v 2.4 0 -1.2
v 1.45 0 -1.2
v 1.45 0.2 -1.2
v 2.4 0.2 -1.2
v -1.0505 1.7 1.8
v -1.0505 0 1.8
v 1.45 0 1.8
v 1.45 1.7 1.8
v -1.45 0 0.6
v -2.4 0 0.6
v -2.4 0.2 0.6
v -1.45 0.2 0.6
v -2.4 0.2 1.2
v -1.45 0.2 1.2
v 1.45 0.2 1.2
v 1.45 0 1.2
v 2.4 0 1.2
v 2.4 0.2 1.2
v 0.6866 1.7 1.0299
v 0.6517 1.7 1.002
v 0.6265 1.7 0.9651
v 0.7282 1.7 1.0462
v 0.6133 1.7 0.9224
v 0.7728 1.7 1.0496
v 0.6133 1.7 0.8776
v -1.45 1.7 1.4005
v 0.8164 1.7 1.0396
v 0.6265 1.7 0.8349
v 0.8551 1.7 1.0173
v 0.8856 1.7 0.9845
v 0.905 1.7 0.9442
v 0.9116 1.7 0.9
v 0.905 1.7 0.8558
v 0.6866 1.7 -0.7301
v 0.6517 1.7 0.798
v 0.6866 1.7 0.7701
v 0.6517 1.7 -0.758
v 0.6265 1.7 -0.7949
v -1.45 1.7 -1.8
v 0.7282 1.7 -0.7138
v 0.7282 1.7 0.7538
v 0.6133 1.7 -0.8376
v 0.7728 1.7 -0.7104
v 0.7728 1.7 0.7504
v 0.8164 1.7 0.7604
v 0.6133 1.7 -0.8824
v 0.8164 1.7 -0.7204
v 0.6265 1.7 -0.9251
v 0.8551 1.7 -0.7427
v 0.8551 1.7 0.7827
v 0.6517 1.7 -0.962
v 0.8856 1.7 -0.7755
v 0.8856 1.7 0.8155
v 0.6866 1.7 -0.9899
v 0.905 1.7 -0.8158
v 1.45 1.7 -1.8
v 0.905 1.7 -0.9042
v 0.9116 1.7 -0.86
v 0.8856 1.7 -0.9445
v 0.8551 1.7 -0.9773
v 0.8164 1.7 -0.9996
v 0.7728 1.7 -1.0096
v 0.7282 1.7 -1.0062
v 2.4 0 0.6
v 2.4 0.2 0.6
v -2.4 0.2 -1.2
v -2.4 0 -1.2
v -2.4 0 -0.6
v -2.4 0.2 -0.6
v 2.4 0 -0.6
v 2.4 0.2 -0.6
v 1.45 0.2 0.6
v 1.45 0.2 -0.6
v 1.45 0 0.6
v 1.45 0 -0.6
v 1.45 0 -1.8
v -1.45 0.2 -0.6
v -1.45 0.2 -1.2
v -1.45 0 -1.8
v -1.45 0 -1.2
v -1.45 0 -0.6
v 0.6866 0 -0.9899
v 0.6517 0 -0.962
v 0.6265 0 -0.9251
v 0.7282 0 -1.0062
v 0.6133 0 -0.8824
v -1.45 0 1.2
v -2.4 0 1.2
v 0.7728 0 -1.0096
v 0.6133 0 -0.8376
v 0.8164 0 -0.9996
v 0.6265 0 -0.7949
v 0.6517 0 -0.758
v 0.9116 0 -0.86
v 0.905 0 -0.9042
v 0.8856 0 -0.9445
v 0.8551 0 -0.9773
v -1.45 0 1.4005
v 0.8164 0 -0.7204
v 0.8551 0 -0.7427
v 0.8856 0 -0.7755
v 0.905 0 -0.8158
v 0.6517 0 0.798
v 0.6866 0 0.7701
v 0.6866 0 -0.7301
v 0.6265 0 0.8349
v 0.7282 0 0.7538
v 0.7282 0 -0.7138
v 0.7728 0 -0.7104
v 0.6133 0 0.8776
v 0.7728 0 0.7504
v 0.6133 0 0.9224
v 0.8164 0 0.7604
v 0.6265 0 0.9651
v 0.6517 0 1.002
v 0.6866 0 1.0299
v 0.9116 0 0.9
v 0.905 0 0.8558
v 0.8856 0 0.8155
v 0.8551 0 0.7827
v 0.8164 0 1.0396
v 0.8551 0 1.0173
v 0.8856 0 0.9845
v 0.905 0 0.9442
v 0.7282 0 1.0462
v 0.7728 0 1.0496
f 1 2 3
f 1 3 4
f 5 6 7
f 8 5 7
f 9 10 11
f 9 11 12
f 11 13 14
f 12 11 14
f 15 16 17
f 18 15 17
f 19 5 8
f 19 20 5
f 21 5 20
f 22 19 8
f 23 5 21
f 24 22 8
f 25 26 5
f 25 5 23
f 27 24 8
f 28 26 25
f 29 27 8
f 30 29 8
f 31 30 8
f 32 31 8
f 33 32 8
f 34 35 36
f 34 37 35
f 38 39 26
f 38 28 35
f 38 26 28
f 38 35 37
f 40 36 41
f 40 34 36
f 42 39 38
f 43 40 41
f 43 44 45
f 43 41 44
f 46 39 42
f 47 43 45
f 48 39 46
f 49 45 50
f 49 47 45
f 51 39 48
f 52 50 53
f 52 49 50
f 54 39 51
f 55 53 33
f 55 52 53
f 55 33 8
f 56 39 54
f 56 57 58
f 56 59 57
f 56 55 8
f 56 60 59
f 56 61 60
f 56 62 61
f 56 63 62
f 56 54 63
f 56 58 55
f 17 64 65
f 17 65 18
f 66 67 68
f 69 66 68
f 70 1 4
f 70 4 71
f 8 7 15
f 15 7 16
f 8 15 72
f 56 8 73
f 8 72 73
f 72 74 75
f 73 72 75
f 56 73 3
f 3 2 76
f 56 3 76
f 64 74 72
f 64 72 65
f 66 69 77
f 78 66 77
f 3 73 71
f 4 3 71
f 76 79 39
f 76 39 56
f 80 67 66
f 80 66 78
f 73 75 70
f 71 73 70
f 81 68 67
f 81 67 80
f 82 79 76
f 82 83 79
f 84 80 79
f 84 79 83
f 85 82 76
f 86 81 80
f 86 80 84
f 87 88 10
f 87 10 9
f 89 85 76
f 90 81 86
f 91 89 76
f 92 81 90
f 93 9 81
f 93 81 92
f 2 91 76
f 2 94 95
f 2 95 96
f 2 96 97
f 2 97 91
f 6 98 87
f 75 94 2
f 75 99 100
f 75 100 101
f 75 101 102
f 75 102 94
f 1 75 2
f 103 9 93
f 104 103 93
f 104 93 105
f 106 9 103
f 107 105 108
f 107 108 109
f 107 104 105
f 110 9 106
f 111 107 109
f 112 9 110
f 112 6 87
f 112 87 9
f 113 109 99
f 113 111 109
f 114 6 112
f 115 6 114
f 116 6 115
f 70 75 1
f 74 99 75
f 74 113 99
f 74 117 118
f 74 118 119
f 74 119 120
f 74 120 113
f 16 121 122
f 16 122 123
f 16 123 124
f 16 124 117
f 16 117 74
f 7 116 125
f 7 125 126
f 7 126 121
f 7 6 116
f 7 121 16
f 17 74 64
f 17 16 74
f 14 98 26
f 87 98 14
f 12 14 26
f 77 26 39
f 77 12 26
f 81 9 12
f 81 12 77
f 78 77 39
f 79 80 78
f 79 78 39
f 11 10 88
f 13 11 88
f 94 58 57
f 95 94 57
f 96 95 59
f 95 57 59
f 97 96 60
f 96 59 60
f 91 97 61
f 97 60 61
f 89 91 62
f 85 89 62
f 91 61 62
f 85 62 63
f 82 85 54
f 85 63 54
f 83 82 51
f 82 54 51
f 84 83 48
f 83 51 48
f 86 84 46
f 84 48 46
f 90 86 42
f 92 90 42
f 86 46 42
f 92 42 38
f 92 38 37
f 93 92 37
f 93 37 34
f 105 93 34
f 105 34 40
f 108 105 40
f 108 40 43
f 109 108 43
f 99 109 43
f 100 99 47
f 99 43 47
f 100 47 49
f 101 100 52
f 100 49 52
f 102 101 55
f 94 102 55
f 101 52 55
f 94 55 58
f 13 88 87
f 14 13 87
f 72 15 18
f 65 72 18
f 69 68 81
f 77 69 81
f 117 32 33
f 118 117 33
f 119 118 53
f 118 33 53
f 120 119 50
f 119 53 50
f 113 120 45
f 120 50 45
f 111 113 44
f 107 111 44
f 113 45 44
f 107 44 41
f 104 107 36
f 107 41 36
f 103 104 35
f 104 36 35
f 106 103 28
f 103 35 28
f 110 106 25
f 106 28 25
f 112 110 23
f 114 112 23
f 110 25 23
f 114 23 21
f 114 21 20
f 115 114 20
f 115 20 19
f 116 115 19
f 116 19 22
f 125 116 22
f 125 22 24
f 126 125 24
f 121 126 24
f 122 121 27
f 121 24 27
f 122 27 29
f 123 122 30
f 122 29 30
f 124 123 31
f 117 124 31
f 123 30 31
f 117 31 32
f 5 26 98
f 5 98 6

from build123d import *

# Parameters (mm, degrees)
SKETCH_1_W          = 2.9
SKETCH_1_H          = 3.6
EXTRUDE_1_DEPTH     = 1.7
CUT_EXTRUDE_1_DEPTH = 1.7
SKETCH_5_W          = 4.8
SKETCH_5_H          = 0.6
EXTRUDE_2_DEPTH     = 0.2
SKETCH_4_R          = 0.15
CUT_EXTRUDE_2_DEPTH = 1.7


with BuildPart() as part:
    # 스케치1 → 보스-돌출1 (new body)
    with BuildSketch(Plane(origin=(0, 0, 0), x_dir=(1, 0, 0), z_dir=(0, 1, 0))):
        Rectangle(SKETCH_1_W, SKETCH_1_H)
    extrude(amount=EXTRUDE_1_DEPTH)

    # 스케치3 → 컷-돌출1 (cut)
    with BuildSketch(Plane(origin=(0, 1.7, 0), x_dir=(1, 0, 0), z_dir=(0, 1, 0))):
        Polygon((-1.45047429, -1.4), (-1.05, -1.80047429), (-1.45, -1.8), align=None)
    extrude(amount=-CUT_EXTRUDE_1_DEPTH, mode=Mode.SUBTRACT)

    # 스케치5 → 보스-돌출2 (add)
    with BuildSketch(Plane.XZ):
        with Locations((0, -0.9)):
            Rectangle(SKETCH_5_W, SKETCH_5_H)
        with Locations((0, 0.9)):
            Rectangle(SKETCH_5_W, SKETCH_5_H)
    extrude(amount=-EXTRUDE_2_DEPTH)

    # 스케치4 → 컷-돌출2 (cut)
    with BuildSketch(Plane(origin=(0, 1.7, 0), x_dir=(1, 0, 0), z_dir=(0, 1, 0))):
        with Locations((0.76162028, 0.86)):
            Circle(SKETCH_4_R)
        with Locations((0.76162028, -0.9)):
            Circle(SKETCH_4_R)
    extrude(amount=-CUT_EXTRUDE_2_DEPTH, mode=Mode.SUBTRACT)


solid = part.part
